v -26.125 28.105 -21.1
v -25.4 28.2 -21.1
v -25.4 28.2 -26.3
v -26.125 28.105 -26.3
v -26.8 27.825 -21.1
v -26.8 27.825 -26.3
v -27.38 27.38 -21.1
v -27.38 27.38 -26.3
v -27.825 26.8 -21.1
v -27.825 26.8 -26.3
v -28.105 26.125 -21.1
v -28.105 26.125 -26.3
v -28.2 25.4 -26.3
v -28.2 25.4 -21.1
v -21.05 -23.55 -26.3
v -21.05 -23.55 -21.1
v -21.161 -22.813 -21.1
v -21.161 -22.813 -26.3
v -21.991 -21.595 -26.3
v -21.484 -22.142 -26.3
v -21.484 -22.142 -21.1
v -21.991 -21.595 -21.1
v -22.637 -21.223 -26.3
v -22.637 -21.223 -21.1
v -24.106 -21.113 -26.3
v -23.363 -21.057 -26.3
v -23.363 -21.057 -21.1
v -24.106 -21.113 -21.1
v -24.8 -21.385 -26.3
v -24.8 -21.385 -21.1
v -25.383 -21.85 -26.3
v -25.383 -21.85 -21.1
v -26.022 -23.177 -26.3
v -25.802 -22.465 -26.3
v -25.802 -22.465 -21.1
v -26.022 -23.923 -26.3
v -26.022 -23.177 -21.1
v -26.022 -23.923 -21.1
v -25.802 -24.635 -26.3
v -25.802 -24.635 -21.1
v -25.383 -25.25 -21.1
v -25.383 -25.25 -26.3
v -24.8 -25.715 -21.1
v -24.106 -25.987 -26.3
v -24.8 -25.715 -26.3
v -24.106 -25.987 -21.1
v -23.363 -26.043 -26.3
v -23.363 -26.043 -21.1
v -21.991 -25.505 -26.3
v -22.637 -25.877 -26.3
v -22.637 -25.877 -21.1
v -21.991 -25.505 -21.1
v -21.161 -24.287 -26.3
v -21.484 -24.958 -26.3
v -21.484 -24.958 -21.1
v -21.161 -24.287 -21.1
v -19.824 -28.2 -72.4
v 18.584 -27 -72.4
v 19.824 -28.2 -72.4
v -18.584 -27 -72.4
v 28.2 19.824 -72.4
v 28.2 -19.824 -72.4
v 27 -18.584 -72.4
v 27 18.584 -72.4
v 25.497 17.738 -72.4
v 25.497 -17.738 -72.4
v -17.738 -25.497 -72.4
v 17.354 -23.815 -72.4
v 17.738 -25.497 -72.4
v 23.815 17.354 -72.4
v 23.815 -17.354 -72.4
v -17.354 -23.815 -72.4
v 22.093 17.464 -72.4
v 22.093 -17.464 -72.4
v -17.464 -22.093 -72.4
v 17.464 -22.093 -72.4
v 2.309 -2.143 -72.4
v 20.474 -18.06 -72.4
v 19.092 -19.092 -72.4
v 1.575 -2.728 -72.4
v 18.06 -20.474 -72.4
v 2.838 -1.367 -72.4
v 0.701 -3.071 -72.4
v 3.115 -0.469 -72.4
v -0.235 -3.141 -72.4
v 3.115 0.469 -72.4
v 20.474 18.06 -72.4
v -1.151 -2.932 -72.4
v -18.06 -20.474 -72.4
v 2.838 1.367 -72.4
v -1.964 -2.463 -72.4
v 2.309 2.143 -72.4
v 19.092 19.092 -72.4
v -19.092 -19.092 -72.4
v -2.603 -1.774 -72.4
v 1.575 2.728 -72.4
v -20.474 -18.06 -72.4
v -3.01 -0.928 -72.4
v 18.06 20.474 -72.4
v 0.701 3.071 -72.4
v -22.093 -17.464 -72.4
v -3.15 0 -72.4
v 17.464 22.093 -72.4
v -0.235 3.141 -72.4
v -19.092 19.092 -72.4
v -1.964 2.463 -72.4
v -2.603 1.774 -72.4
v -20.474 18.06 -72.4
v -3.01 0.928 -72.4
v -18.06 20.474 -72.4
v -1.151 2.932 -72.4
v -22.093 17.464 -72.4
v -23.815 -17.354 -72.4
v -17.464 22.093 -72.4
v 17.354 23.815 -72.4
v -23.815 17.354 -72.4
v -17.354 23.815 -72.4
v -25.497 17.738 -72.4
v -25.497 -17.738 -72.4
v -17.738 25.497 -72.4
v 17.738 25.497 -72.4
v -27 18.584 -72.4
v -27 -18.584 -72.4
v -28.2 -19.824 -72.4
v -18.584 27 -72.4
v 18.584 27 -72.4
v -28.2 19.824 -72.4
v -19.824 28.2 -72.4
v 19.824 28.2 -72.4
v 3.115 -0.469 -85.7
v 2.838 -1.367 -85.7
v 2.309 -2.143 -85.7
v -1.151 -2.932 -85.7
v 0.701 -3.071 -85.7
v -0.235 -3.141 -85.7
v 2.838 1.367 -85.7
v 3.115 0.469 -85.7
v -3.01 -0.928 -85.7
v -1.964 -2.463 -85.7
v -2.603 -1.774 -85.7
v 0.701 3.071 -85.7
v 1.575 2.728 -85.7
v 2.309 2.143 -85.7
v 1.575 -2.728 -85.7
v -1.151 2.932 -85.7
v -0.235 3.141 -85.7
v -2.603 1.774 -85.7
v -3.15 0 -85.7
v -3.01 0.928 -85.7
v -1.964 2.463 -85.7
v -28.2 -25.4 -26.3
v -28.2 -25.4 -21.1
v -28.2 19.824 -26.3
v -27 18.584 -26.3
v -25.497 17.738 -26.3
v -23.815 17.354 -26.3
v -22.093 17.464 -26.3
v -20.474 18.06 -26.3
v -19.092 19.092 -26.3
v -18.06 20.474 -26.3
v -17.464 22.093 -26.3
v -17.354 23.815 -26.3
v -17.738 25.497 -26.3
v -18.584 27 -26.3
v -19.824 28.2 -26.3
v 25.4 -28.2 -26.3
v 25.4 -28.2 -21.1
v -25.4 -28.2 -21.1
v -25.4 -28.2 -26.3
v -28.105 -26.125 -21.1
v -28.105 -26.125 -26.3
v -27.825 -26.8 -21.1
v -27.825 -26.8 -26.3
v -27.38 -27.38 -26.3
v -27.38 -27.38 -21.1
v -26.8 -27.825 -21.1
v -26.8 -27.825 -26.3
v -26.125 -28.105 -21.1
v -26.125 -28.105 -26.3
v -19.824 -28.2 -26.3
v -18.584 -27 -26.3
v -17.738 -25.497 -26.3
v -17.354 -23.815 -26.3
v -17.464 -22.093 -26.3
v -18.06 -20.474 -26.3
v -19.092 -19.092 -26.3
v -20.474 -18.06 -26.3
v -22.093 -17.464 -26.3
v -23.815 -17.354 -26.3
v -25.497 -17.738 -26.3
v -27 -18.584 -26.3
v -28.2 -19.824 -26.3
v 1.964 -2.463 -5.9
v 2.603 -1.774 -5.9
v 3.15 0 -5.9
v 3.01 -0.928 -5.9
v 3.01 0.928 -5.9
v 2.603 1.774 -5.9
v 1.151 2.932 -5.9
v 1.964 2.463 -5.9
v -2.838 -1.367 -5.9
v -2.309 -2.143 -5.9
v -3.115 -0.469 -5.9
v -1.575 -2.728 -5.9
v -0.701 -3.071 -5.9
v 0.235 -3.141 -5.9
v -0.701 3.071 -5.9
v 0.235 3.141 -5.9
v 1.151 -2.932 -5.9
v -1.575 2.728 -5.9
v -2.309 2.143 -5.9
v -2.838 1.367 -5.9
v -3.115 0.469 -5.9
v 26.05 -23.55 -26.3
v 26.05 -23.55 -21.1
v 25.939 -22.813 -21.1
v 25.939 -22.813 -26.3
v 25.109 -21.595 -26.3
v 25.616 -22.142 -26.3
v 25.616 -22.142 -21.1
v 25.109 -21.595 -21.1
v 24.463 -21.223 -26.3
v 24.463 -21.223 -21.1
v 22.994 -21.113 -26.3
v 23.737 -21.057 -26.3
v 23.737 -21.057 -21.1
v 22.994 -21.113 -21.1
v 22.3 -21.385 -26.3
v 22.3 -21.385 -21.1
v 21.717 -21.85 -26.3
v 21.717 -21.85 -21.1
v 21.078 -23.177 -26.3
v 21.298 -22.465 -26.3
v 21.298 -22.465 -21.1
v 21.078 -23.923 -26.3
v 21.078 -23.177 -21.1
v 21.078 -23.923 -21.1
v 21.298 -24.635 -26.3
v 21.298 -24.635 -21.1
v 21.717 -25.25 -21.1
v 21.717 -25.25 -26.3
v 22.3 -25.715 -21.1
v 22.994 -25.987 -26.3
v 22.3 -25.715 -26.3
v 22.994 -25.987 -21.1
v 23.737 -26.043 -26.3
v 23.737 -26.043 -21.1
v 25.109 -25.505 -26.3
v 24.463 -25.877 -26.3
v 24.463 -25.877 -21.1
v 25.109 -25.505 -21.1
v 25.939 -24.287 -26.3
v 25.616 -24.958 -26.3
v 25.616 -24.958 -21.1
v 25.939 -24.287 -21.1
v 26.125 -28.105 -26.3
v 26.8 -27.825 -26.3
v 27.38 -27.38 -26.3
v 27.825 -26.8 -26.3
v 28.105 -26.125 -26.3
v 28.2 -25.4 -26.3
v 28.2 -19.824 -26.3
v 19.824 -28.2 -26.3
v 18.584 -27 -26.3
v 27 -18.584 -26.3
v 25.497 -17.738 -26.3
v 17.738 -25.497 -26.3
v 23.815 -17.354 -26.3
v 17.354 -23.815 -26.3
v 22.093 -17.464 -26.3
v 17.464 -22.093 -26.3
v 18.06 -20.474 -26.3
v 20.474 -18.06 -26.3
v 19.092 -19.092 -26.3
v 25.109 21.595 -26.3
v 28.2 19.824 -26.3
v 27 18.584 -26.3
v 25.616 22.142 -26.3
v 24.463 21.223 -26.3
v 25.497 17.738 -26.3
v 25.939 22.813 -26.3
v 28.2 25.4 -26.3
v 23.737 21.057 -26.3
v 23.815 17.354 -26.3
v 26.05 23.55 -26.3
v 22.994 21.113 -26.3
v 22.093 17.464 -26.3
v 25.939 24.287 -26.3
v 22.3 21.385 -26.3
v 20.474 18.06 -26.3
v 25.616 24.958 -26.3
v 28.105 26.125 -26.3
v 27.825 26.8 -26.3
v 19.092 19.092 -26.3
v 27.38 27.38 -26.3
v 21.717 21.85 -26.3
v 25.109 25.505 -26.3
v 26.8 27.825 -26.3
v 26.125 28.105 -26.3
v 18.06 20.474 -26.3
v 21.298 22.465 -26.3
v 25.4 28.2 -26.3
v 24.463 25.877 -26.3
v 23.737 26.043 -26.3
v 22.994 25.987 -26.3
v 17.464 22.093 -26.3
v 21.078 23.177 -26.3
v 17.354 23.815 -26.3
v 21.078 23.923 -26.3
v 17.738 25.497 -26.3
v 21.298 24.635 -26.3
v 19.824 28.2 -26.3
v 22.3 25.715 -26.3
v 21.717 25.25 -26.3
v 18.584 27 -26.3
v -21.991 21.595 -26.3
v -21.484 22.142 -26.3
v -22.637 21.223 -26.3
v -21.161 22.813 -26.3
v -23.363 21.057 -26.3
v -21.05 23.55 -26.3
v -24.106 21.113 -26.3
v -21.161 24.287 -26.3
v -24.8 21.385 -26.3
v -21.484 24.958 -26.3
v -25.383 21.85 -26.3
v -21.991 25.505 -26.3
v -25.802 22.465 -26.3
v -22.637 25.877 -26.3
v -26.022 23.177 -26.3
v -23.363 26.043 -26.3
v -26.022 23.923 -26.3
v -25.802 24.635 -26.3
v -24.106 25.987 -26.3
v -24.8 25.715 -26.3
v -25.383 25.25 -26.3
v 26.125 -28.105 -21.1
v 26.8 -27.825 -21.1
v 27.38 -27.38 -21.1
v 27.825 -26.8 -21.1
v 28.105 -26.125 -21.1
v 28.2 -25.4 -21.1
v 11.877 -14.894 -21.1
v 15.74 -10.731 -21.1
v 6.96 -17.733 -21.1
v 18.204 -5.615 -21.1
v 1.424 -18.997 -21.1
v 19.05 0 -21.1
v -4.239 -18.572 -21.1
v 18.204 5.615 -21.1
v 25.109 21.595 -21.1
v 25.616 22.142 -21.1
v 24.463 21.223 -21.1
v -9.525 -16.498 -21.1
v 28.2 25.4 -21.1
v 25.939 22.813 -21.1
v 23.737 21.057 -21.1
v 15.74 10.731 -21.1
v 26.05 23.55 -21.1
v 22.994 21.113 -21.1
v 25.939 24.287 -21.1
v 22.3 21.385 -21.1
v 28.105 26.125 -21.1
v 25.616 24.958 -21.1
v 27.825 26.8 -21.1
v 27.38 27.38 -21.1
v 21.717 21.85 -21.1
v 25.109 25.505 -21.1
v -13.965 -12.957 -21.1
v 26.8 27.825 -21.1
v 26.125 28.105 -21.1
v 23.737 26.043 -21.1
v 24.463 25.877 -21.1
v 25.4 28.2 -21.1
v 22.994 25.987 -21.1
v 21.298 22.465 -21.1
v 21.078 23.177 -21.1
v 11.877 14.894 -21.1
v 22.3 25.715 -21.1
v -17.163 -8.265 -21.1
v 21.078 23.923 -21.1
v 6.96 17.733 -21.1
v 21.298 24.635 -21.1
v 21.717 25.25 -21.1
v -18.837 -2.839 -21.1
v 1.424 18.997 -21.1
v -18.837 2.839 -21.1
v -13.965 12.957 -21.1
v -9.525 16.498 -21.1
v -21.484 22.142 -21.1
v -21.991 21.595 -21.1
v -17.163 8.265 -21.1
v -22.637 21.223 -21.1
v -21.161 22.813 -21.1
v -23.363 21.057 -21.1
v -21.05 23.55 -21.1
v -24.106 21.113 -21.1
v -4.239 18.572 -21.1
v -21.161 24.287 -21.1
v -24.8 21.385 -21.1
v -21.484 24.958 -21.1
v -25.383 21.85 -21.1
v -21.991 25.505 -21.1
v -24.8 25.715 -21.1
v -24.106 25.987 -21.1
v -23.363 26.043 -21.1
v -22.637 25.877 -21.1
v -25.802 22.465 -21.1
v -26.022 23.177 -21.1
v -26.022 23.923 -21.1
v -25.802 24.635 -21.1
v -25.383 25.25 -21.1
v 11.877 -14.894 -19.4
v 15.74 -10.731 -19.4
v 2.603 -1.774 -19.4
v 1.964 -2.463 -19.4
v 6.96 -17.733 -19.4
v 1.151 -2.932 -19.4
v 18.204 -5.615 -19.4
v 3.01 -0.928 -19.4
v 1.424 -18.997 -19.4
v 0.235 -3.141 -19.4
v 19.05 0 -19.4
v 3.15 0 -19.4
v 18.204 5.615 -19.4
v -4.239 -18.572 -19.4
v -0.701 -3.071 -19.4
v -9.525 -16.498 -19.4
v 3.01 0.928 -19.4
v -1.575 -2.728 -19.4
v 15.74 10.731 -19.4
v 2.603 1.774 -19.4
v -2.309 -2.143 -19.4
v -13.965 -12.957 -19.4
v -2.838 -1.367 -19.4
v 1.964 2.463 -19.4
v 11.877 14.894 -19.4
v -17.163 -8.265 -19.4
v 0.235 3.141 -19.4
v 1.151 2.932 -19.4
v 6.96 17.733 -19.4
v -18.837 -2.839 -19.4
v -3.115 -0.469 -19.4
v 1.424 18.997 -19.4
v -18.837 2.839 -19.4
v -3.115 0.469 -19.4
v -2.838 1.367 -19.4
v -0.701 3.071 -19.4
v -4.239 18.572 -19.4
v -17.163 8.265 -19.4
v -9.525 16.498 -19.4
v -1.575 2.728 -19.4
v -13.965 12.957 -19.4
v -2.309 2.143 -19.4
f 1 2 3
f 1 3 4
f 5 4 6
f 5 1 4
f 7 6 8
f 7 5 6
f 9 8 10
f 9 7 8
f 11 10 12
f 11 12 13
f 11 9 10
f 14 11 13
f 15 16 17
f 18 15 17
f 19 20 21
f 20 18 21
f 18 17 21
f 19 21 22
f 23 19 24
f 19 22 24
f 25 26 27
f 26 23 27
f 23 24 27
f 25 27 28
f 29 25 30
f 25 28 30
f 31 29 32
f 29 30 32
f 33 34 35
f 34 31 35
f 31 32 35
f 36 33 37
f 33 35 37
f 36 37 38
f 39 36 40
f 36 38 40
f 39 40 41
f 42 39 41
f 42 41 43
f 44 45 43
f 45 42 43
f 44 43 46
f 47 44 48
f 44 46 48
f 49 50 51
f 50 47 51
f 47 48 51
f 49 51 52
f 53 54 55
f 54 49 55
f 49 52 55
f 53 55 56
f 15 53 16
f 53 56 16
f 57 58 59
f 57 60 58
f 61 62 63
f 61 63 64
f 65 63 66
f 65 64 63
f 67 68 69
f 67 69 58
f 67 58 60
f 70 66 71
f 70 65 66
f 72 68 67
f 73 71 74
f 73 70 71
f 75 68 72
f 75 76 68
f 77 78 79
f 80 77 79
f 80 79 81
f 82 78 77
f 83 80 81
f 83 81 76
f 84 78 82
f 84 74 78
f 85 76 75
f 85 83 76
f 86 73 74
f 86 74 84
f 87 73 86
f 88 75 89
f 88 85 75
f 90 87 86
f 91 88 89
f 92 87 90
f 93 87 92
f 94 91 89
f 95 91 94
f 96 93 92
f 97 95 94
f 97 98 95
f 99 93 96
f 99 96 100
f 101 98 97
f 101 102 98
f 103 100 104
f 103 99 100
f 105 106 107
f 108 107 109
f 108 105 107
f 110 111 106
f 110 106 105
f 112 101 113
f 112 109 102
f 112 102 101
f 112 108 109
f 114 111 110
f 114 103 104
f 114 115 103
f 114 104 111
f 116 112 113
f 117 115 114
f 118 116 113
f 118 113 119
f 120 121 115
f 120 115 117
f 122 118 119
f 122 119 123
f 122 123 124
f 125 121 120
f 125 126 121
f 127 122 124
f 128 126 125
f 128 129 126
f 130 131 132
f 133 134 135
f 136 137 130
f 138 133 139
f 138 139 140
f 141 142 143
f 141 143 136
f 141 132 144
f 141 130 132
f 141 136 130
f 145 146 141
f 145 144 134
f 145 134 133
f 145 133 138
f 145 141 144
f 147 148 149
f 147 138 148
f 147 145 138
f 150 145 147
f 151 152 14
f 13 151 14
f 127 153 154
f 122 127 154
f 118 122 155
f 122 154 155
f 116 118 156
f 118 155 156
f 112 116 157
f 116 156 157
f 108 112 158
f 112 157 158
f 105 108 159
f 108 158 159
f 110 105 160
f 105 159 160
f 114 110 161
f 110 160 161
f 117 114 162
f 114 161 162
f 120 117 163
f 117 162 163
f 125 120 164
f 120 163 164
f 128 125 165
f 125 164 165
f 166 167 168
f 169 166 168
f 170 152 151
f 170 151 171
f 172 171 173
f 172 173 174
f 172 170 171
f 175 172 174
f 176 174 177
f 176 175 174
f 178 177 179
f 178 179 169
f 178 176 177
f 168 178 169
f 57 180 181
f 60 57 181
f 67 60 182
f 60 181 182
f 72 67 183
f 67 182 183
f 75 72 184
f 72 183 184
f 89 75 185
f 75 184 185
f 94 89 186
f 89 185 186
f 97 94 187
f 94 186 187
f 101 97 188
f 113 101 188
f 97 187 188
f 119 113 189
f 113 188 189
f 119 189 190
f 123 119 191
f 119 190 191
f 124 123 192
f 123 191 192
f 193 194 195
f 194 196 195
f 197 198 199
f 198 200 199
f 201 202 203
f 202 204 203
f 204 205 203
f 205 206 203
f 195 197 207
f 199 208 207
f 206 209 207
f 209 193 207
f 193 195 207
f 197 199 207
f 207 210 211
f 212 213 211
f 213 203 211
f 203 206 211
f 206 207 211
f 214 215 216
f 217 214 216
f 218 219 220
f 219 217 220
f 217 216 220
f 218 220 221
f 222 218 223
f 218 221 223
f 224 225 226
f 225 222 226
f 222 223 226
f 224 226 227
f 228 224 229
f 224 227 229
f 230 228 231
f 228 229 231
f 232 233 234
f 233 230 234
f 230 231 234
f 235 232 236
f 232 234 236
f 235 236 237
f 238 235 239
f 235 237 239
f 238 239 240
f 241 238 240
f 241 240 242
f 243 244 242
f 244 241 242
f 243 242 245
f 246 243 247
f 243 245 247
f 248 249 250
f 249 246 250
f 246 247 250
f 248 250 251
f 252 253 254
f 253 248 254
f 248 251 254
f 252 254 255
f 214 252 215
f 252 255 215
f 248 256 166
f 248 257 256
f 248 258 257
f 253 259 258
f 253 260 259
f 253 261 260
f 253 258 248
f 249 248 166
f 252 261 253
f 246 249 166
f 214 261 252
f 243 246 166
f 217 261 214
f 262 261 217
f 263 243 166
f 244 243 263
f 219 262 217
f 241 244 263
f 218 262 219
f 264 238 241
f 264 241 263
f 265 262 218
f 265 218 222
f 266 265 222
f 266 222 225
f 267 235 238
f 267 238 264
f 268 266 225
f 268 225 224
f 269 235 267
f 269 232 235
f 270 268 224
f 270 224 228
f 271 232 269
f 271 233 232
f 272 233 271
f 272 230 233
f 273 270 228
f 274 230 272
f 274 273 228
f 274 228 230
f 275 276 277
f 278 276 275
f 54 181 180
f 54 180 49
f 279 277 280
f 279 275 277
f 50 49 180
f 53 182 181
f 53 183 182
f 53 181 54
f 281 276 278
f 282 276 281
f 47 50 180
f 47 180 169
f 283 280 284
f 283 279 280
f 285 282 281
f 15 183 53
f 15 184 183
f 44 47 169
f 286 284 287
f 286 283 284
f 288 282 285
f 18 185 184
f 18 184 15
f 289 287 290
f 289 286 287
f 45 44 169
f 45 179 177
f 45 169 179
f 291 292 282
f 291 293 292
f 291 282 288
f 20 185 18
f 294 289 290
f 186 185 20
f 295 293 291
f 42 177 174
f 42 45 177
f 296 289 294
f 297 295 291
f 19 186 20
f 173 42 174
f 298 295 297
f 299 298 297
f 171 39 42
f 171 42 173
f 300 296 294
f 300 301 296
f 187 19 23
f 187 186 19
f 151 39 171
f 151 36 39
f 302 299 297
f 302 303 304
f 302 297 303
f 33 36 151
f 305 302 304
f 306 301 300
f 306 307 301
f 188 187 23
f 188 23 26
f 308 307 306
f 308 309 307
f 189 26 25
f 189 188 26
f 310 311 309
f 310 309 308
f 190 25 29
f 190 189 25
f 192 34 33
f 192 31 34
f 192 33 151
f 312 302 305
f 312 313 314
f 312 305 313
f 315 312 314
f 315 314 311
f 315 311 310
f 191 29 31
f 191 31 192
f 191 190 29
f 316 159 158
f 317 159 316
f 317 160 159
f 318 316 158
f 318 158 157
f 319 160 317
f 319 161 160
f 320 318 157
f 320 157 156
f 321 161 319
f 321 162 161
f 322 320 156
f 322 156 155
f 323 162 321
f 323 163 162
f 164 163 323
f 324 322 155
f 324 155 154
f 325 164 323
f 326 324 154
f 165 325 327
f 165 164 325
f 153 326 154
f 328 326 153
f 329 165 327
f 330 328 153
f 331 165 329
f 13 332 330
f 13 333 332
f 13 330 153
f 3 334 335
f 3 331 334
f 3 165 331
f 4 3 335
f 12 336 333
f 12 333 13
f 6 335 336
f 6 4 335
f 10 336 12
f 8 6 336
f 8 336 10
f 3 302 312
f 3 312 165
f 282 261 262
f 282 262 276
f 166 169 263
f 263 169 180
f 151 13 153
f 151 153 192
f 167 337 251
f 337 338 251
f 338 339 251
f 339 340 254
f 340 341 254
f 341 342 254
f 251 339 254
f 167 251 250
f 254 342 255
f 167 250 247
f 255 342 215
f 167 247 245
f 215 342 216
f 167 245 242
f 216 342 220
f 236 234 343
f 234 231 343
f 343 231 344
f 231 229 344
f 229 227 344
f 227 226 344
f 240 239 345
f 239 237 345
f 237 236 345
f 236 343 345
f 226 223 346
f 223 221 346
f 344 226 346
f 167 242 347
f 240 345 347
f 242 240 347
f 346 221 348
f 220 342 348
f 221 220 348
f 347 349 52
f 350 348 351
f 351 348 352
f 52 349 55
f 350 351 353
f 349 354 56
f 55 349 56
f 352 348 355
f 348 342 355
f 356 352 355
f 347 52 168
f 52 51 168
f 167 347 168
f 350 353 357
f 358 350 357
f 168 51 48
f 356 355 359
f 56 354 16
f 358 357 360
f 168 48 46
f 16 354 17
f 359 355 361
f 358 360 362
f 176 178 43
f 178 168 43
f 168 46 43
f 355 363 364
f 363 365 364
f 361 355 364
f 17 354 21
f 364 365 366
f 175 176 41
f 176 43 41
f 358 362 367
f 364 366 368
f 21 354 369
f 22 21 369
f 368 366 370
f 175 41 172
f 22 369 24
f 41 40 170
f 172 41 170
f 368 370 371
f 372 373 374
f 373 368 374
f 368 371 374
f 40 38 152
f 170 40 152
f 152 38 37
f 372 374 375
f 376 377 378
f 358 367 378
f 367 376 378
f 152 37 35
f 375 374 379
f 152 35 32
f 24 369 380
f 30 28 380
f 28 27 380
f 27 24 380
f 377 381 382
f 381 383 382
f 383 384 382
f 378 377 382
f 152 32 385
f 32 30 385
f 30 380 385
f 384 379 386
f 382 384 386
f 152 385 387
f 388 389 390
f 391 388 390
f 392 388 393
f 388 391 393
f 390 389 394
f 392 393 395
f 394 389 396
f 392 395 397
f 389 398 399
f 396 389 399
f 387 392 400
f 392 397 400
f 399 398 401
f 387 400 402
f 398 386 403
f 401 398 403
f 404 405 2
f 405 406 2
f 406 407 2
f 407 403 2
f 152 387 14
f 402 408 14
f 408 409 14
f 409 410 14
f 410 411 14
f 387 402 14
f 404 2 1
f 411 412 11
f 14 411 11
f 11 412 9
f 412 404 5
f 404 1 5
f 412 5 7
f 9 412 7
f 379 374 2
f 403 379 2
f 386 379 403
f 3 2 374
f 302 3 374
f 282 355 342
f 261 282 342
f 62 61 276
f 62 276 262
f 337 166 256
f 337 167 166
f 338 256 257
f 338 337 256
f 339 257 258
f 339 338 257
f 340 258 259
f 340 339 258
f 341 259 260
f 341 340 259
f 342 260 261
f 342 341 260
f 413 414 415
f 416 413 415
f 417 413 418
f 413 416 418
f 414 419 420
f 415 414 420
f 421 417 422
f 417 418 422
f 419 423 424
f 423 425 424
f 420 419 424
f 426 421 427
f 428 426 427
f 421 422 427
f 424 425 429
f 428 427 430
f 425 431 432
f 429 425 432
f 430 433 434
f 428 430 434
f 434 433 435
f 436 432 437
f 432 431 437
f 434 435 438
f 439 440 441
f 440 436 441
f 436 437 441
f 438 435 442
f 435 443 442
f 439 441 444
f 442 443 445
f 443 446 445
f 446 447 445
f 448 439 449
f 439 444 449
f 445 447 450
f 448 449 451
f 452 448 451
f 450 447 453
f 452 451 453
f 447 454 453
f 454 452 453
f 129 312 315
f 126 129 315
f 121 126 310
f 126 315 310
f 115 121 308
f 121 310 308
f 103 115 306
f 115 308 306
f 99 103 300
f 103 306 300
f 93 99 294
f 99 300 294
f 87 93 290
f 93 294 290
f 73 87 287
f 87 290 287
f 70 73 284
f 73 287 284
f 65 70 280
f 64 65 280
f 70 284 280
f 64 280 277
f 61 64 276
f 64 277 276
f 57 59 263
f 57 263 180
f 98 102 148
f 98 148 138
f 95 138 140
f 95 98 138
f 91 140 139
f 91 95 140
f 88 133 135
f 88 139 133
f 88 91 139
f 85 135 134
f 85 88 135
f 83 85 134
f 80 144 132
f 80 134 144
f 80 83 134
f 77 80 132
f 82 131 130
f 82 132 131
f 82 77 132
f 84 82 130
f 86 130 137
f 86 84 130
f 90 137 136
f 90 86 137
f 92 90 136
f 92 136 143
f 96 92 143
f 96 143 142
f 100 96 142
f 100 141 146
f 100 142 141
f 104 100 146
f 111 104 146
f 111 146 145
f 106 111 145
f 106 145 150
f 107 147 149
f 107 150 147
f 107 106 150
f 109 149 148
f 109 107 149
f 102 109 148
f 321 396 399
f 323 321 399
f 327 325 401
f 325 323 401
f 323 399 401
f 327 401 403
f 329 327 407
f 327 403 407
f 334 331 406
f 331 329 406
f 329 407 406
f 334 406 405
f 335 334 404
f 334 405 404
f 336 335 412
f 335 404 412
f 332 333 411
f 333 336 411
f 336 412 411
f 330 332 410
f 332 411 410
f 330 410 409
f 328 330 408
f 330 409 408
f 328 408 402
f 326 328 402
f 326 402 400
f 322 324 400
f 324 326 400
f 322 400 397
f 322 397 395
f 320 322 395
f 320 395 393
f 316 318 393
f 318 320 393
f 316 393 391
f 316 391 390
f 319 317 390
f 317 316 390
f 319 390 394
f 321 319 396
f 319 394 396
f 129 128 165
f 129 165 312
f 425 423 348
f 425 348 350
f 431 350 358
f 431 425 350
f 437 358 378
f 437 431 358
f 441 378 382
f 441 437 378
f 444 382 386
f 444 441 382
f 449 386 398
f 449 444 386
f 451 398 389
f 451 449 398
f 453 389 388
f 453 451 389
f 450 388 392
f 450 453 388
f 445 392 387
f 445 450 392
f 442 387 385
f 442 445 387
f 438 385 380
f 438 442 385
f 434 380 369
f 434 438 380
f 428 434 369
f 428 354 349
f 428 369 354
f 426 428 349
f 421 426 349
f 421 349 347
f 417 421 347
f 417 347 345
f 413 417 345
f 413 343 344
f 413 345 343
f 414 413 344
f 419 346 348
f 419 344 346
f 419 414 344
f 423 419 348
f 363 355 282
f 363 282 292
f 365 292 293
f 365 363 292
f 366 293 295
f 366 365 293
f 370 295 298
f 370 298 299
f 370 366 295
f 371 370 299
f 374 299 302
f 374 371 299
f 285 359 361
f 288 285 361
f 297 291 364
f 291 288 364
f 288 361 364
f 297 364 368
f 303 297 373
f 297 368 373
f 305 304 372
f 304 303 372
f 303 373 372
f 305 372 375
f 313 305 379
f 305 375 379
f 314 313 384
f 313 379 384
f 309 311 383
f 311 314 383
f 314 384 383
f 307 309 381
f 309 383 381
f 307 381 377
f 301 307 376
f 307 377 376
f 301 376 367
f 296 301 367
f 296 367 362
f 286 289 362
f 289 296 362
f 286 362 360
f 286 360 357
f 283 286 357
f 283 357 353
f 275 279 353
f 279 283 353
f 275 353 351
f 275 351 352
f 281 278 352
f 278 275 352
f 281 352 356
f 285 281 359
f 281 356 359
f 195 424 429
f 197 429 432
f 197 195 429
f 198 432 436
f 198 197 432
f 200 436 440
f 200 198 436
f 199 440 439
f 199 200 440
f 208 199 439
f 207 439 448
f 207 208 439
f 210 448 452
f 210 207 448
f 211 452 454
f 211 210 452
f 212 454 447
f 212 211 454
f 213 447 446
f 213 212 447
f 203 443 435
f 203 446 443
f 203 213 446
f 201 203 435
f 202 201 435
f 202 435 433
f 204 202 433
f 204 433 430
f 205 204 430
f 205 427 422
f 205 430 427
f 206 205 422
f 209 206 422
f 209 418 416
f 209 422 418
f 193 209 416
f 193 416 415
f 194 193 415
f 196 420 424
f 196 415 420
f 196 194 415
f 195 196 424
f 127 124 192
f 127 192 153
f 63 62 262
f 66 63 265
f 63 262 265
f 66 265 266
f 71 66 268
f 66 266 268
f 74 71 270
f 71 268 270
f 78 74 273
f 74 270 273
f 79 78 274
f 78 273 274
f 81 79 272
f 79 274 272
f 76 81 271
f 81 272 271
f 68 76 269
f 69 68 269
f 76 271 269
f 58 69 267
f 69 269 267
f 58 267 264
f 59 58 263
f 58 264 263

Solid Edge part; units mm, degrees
sketch "Sketch1" plane through (0, 0, 0) normal (0, 0, 1) x (1, 0, 0)
  circle A0 centre (0, 0) radius 3.15
extrude "Protrusion1" add sketch "Sketch1" against normal blind 9
sketch "Sketch2" plane through (0, 0, -9) normal (0, 0, -1) x (1, 0, 0)
  circle A0 centre (0, 0) radius 3.15
extrude "ExtrudedProtrusion_2" add sketch "Sketch2" along normal blind 10.4
sketch "Sketch3" plane through (0, 0, -19.4) normal (0, 0, -1) x (1, 0, 0)
  circle A0 centre (0, 0) radius 19.05
  dimension "D1" = 38.1
extrude "ExtrudedProtrusion_3" add sketch "Sketch3" along normal blind 1.7
sketch "Sketch4" plane through (0, 0, -21.1) normal (0, 0, -1) x (1, 0, 0)
  circle A0 centre (23.55, 23.55) radius 2.5
  circle A1 centre (23.55, -23.55) radius 2.5
  circle A2 centre (-23.55, -23.55) radius 2.5
  circle A3 centre (-23.55, 23.55) radius 2.5
  line L0 (-25.4, -28.2) -> (25.4, -28.2)
  arc A4 (28.2, -25.4) -> (25.4, -28.2) centre (25.4, -25.4) cw
  line L1 (28.2, -25.4) -> (28.2, 25.4)
  arc A5 (25.4, 28.2) -> (28.2, 25.4) centre (25.4, 25.4) cw
  line L2 (25.4, 28.2) -> (-25.4, 28.2)
  arc A6 (-28.2, 25.4) -> (-25.4, 28.2) centre (-25.4, 25.4) cw
  line L3 (-28.2, 25.4) -> (-28.2, -25.4)
  arc A7 (-25.4, -28.2) -> (-28.2, -25.4) centre (-25.4, -25.4) cw
  dimension "D1" = 47.1
  dimension "D2" = 47.1
  dimension "D3" = 56.4
extrude "ExtrudedProtrusion_4" add sketch "Sketch4" along normal blind 5.2
sketch "Sketch5" plane through (0, 0, -26.3) normal (0, 0, -1) x (0, -1, 0)
  line L0 (-28.2, 19.8235) -> (-28.2, -19.8235)
  line L1 (-19.8235, -28.2) -> (19.8235, -28.2)
  line L2 (28.2, -19.8235) -> (28.2, 19.8235)
  line L3 (19.8235, 28.2) -> (-19.8235, 28.2)
  arc A0 (-28.2, -19.8235) -> (-19.8235, -28.2) centre (-23.3345, -23.3345) cw
  arc A1 (19.8235, -28.2) -> (28.2, -19.8235) centre (23.3345, -23.3345) cw
  arc A2 (28.2, 19.8235) -> (19.8235, 28.2) centre (23.3345, 23.3345) cw
  arc A3 (-19.8235, 28.2) -> (-28.2, 19.8235) centre (-23.3345, 23.3345) cw
extrude "ExtrudedProtrusion_5" add sketch "Sketch5" along normal blind 46.1
sketch "Sketch6" plane through (0, 0, -72.4) normal (0, 0, -1) x (-1, 0, 0)
  circle A0 centre (0, 0) radius 3.15
extrude "ExtrudedProtrusion_6" add sketch "Sketch6" along normal blind 13.3
sketch "Sketch7" plane through (0, 0, 0) normal (0, -1, 0) x (1, 0, 0)
  line L0 (0, -5.9) -> (23.1327, -5.9)
extrude "Cutout1" cut sketch "Sketch7" along normal through all and the other way through all material side at (11.5663, 0, -5.85)
properties material "Stainless steel"
